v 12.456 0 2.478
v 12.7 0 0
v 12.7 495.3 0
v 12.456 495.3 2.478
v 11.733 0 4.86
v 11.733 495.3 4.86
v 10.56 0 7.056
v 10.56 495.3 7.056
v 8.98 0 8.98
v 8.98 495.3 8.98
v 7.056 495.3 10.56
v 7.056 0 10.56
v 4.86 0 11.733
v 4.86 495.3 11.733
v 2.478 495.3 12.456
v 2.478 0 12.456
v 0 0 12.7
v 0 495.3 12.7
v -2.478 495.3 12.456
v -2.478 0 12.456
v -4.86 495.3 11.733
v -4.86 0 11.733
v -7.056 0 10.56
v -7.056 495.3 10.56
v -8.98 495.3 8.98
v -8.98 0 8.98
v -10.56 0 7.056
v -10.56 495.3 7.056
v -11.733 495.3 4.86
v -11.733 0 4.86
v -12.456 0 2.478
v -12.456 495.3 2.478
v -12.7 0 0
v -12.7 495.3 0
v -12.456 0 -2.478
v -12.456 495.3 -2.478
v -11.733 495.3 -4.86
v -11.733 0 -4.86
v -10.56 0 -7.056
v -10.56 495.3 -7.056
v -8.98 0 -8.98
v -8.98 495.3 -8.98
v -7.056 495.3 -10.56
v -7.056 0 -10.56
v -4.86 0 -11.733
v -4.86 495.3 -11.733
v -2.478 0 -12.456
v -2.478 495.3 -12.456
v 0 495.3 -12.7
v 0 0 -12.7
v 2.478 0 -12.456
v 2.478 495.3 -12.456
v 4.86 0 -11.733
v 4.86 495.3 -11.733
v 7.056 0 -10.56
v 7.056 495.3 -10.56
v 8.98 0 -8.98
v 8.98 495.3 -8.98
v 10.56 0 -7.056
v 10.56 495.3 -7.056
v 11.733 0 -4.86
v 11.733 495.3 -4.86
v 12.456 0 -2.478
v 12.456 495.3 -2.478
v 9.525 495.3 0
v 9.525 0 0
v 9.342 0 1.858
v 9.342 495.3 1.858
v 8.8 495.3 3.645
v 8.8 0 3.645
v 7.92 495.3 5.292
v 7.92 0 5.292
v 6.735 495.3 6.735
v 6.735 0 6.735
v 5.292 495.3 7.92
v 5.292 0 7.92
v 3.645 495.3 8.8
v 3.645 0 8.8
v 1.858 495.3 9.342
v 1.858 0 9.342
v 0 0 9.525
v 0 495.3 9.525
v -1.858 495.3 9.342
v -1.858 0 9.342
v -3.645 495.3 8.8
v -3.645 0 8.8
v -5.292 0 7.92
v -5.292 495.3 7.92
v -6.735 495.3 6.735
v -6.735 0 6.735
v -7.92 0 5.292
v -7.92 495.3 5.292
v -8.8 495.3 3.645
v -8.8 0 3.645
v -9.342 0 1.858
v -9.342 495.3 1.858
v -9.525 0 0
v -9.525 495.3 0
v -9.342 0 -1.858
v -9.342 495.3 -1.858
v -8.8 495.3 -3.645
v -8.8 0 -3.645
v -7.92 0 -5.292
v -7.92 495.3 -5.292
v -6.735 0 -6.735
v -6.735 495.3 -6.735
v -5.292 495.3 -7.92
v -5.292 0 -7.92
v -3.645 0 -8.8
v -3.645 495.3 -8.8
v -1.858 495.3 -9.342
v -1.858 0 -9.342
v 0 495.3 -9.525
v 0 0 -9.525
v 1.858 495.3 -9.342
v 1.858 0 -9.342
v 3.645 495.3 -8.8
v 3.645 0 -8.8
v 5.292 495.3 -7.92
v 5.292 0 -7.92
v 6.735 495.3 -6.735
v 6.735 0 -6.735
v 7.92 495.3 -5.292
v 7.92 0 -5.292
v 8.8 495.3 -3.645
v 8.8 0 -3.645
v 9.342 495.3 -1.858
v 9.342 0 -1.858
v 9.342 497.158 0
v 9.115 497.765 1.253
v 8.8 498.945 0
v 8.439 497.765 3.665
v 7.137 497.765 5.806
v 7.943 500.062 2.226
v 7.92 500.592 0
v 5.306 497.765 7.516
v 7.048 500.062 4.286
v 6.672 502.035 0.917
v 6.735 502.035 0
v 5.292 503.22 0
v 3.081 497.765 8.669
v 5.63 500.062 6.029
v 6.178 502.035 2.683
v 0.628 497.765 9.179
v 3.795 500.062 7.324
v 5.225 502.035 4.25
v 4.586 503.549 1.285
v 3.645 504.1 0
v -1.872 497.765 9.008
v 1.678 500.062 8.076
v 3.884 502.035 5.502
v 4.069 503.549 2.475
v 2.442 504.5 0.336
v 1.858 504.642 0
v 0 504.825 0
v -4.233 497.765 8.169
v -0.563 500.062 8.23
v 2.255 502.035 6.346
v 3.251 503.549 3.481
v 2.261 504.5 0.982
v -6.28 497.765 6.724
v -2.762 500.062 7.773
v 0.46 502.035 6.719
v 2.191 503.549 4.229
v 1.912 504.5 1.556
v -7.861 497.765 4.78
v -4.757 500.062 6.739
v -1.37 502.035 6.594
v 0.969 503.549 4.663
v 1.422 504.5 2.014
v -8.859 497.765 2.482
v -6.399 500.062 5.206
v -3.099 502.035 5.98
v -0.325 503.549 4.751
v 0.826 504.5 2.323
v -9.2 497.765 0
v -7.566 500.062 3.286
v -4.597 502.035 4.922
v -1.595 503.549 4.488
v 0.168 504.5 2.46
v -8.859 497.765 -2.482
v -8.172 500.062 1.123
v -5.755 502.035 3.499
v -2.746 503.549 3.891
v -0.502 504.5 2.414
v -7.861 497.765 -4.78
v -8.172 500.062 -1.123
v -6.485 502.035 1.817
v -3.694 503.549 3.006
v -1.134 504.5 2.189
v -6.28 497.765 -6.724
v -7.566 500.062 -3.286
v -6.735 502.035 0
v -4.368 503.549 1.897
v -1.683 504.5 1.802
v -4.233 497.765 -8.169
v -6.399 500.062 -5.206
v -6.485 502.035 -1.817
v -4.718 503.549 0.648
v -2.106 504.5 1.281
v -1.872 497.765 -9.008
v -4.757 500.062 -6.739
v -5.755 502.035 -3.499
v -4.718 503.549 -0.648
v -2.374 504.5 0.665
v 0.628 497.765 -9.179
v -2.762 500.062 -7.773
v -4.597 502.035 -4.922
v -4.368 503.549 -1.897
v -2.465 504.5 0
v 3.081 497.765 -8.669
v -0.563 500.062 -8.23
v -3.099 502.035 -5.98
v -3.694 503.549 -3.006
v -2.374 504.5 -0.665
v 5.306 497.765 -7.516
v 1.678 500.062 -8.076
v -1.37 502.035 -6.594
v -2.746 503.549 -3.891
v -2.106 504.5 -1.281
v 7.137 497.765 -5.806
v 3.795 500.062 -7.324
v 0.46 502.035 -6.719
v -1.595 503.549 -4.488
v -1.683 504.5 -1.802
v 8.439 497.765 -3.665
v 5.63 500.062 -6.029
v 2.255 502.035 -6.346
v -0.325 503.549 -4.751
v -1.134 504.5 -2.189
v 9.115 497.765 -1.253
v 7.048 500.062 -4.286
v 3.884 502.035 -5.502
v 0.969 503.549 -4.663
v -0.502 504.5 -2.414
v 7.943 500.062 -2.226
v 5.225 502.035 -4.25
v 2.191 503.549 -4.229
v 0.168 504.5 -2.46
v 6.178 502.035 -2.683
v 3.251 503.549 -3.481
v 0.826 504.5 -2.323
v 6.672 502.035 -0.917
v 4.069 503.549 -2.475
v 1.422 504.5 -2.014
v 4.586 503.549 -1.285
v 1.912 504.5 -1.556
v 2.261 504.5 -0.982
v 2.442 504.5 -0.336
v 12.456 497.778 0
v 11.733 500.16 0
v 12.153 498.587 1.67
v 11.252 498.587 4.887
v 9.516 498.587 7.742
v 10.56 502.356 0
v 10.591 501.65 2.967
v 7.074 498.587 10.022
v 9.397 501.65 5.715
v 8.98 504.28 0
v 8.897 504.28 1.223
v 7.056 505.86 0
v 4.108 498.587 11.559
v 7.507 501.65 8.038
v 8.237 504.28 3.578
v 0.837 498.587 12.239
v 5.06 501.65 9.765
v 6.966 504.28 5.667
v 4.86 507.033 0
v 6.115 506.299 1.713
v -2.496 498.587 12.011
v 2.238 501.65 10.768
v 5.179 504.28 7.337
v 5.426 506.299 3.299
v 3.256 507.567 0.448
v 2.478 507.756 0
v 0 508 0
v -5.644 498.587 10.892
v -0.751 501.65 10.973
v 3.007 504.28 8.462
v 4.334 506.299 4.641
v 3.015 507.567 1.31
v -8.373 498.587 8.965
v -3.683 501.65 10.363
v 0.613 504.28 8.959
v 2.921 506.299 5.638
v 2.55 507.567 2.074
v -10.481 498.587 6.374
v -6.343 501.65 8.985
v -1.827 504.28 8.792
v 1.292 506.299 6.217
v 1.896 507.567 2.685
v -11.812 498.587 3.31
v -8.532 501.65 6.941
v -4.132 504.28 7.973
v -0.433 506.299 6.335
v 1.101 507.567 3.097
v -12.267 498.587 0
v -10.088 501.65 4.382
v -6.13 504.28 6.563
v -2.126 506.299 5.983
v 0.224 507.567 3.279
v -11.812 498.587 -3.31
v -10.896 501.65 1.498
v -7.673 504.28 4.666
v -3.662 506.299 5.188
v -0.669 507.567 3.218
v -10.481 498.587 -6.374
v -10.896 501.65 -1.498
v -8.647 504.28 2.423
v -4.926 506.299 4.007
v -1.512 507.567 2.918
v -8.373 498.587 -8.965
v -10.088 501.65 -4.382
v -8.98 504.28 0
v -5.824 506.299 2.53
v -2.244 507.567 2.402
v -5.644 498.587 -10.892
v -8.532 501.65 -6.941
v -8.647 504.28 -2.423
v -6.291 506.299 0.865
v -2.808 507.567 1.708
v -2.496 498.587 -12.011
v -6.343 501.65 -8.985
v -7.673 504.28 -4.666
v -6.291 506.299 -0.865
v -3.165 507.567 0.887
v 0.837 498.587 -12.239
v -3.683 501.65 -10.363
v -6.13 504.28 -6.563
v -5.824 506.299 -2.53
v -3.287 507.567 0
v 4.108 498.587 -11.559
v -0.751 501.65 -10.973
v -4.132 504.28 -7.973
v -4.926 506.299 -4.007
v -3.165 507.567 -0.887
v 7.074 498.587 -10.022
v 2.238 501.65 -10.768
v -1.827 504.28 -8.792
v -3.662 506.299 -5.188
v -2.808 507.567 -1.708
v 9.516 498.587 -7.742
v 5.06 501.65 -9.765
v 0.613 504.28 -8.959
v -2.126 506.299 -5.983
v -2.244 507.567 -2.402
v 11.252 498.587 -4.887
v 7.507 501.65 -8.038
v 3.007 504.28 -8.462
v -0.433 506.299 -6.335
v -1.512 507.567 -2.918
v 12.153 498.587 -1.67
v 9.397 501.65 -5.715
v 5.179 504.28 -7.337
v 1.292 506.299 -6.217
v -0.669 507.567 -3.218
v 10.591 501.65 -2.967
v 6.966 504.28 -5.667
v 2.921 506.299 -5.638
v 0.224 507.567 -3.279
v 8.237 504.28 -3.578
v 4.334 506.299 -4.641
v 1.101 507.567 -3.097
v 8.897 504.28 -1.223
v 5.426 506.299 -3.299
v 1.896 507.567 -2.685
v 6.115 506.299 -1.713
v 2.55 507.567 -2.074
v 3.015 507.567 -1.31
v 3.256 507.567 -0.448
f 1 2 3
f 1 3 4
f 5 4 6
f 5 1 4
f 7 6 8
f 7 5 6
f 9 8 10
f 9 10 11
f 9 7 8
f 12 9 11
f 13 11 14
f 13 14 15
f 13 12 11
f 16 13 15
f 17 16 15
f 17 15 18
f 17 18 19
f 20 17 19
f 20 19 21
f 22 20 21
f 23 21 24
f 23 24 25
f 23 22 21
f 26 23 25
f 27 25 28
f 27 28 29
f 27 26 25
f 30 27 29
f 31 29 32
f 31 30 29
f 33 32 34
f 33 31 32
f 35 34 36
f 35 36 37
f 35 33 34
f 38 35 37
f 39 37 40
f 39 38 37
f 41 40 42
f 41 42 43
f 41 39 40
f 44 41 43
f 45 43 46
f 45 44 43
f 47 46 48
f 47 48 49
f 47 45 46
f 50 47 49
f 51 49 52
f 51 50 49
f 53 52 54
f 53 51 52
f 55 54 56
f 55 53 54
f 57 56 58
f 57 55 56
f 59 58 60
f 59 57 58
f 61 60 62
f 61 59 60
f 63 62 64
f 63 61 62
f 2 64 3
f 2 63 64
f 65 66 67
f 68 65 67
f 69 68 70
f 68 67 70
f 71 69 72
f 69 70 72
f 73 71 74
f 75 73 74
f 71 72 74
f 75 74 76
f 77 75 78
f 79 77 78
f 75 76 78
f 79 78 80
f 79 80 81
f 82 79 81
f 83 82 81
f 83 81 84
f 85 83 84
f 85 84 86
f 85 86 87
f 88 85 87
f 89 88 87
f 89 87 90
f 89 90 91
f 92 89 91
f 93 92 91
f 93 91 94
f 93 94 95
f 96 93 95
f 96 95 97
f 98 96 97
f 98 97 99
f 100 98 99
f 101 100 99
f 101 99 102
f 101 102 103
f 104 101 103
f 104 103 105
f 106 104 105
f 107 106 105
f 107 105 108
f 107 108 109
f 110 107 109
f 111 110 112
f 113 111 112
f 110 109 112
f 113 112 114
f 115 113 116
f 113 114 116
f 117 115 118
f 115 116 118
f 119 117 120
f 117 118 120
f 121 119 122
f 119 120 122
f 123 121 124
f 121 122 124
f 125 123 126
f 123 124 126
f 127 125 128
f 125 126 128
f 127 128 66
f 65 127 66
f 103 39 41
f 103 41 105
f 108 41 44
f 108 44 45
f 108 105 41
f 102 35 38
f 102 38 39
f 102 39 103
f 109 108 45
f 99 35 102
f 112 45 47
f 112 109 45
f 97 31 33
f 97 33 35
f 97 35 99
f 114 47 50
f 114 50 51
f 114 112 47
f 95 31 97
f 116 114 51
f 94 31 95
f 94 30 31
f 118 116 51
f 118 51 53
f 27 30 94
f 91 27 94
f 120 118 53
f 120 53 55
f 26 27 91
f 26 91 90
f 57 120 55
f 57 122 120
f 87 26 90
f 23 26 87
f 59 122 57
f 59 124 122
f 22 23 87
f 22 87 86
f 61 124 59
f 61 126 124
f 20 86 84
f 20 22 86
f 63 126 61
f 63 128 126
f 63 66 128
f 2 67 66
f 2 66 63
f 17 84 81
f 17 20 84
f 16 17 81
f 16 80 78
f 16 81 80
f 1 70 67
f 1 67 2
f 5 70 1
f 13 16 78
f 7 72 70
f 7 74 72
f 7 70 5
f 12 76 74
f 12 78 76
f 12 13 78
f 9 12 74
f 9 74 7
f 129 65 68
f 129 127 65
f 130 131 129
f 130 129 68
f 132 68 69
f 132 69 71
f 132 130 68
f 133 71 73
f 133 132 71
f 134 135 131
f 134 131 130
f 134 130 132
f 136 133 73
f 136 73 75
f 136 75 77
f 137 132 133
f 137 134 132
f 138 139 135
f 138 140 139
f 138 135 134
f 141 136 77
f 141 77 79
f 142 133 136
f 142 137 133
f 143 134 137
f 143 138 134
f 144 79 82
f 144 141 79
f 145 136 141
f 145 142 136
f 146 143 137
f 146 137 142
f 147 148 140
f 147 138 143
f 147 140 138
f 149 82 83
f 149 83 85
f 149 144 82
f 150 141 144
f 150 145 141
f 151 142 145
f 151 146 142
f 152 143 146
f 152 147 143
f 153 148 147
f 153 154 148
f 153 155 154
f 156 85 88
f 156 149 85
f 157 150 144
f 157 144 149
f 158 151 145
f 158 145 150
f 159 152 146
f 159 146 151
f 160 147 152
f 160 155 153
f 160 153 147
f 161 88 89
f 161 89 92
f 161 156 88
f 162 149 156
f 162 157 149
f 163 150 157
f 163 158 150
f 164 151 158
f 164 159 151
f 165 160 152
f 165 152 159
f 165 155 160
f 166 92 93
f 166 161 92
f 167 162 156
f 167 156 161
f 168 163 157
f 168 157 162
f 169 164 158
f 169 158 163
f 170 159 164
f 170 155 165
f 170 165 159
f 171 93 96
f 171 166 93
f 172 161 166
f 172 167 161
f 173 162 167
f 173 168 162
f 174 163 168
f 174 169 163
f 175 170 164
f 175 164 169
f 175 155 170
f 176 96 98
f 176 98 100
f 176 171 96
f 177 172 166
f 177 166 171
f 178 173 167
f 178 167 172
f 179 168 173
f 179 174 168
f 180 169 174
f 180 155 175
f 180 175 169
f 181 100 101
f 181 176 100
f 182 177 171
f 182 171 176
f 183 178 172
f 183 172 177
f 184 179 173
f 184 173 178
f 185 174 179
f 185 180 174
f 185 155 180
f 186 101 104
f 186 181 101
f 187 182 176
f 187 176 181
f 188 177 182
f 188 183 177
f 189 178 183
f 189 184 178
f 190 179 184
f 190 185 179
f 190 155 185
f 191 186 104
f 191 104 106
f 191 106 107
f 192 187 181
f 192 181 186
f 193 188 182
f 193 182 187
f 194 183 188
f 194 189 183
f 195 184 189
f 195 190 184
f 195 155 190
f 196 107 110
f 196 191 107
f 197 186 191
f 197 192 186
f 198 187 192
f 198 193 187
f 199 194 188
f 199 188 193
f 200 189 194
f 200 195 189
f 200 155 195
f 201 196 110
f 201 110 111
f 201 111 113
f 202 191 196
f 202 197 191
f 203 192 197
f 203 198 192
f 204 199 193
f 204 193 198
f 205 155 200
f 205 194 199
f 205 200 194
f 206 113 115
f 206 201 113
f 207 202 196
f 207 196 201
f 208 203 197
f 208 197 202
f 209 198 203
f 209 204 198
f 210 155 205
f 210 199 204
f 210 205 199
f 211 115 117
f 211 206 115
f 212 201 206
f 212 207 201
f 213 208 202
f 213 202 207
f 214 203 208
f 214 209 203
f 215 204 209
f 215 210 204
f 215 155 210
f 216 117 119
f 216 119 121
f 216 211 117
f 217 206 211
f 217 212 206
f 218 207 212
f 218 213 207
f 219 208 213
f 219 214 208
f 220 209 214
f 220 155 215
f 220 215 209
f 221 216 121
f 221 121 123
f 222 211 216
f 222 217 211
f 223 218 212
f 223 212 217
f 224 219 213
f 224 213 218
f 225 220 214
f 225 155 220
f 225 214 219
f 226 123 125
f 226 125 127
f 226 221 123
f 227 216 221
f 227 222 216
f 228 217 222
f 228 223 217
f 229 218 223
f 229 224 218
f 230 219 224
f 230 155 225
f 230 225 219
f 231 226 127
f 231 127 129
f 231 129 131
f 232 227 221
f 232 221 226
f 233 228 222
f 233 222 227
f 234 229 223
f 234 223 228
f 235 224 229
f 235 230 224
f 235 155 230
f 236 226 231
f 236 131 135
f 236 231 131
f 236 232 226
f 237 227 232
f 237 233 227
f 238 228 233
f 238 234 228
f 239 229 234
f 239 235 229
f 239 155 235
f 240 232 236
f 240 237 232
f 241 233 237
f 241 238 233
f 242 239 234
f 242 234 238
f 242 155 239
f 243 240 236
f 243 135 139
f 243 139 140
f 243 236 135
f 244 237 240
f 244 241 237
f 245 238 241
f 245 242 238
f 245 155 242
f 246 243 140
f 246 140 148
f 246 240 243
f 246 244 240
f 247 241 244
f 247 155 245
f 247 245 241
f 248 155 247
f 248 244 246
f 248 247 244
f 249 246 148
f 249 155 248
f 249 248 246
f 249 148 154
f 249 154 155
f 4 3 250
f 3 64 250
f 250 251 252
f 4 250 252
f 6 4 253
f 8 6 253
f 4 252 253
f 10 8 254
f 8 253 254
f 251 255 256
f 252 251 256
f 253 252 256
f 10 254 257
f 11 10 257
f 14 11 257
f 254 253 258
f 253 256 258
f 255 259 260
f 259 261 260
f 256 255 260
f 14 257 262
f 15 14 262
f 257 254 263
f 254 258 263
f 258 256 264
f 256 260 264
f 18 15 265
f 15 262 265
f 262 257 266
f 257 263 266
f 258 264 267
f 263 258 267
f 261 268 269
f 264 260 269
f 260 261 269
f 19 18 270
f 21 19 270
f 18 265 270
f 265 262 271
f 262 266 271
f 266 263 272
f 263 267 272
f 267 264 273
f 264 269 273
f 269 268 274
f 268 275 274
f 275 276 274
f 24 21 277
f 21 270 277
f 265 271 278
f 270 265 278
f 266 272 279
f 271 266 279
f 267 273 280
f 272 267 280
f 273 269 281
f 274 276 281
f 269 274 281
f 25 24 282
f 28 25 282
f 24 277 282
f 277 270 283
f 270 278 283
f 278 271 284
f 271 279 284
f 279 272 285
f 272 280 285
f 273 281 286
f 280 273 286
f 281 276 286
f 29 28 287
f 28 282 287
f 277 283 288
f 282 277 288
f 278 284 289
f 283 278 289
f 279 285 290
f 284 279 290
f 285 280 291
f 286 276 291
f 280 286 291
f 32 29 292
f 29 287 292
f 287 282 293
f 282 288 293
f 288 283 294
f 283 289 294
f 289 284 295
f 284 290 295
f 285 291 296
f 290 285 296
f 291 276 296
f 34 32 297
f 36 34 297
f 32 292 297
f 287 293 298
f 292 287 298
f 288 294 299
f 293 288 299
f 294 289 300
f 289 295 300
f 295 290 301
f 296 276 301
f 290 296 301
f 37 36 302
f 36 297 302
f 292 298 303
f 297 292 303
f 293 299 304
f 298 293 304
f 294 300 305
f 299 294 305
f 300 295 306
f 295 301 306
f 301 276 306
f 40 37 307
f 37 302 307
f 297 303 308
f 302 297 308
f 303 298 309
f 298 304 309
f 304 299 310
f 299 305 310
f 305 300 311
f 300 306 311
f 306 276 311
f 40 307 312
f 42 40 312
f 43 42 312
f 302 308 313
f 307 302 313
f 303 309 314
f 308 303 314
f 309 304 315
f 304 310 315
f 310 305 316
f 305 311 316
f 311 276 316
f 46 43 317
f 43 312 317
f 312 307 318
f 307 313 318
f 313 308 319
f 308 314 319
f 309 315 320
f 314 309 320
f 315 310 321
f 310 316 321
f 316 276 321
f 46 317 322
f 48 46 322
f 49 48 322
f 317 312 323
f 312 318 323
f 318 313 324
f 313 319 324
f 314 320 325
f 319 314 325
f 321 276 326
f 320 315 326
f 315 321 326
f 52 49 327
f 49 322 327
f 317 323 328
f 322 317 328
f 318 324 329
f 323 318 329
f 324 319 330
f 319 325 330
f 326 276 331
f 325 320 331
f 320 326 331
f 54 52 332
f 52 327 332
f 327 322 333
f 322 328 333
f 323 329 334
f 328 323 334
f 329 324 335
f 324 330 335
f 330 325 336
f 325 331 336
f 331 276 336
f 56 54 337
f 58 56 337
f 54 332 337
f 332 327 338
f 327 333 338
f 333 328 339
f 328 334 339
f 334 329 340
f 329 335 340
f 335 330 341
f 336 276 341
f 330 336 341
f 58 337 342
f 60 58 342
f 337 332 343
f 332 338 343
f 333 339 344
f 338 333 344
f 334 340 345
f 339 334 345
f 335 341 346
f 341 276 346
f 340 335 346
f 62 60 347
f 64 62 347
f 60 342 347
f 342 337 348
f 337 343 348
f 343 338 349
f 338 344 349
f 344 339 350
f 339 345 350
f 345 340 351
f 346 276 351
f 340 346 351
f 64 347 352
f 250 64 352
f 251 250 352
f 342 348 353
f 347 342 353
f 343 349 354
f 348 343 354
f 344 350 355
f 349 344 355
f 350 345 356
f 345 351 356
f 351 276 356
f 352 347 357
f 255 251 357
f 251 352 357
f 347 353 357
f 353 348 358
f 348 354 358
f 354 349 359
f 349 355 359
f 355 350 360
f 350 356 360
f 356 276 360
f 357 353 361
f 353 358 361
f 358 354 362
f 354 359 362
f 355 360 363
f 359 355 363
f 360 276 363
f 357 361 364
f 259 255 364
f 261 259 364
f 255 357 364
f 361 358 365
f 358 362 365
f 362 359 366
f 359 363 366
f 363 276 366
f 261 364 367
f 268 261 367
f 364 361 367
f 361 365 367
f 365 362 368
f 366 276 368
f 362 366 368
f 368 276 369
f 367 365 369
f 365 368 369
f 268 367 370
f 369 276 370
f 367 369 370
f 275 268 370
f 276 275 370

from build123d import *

# Parameters (mm, degrees)
F0_R     = 12.7
F1_DEPTH = 508
F2_R     = 12.7
F3_T     = -3.175


with BuildPart() as f1:
    # F0 (on Front) → F1 (new body)
    with BuildSketch(Plane.XZ):
        Circle(F0_R)
    extrude(amount=-F1_DEPTH)

    # F2
    f2_edges = [f1.edges().sort_by_distance(p)[0] for p in [
        (-12.7, 508, 0),
    ]]
    fillet(f2_edges, radius=F2_R)

    # F3
    f3_openings = [f1.faces().sort_by_distance(p)[0] for p in [
        (0, 0, 0),
    ]]
    offset(amount=F3_T, openings=f3_openings)


solid = f1.part
